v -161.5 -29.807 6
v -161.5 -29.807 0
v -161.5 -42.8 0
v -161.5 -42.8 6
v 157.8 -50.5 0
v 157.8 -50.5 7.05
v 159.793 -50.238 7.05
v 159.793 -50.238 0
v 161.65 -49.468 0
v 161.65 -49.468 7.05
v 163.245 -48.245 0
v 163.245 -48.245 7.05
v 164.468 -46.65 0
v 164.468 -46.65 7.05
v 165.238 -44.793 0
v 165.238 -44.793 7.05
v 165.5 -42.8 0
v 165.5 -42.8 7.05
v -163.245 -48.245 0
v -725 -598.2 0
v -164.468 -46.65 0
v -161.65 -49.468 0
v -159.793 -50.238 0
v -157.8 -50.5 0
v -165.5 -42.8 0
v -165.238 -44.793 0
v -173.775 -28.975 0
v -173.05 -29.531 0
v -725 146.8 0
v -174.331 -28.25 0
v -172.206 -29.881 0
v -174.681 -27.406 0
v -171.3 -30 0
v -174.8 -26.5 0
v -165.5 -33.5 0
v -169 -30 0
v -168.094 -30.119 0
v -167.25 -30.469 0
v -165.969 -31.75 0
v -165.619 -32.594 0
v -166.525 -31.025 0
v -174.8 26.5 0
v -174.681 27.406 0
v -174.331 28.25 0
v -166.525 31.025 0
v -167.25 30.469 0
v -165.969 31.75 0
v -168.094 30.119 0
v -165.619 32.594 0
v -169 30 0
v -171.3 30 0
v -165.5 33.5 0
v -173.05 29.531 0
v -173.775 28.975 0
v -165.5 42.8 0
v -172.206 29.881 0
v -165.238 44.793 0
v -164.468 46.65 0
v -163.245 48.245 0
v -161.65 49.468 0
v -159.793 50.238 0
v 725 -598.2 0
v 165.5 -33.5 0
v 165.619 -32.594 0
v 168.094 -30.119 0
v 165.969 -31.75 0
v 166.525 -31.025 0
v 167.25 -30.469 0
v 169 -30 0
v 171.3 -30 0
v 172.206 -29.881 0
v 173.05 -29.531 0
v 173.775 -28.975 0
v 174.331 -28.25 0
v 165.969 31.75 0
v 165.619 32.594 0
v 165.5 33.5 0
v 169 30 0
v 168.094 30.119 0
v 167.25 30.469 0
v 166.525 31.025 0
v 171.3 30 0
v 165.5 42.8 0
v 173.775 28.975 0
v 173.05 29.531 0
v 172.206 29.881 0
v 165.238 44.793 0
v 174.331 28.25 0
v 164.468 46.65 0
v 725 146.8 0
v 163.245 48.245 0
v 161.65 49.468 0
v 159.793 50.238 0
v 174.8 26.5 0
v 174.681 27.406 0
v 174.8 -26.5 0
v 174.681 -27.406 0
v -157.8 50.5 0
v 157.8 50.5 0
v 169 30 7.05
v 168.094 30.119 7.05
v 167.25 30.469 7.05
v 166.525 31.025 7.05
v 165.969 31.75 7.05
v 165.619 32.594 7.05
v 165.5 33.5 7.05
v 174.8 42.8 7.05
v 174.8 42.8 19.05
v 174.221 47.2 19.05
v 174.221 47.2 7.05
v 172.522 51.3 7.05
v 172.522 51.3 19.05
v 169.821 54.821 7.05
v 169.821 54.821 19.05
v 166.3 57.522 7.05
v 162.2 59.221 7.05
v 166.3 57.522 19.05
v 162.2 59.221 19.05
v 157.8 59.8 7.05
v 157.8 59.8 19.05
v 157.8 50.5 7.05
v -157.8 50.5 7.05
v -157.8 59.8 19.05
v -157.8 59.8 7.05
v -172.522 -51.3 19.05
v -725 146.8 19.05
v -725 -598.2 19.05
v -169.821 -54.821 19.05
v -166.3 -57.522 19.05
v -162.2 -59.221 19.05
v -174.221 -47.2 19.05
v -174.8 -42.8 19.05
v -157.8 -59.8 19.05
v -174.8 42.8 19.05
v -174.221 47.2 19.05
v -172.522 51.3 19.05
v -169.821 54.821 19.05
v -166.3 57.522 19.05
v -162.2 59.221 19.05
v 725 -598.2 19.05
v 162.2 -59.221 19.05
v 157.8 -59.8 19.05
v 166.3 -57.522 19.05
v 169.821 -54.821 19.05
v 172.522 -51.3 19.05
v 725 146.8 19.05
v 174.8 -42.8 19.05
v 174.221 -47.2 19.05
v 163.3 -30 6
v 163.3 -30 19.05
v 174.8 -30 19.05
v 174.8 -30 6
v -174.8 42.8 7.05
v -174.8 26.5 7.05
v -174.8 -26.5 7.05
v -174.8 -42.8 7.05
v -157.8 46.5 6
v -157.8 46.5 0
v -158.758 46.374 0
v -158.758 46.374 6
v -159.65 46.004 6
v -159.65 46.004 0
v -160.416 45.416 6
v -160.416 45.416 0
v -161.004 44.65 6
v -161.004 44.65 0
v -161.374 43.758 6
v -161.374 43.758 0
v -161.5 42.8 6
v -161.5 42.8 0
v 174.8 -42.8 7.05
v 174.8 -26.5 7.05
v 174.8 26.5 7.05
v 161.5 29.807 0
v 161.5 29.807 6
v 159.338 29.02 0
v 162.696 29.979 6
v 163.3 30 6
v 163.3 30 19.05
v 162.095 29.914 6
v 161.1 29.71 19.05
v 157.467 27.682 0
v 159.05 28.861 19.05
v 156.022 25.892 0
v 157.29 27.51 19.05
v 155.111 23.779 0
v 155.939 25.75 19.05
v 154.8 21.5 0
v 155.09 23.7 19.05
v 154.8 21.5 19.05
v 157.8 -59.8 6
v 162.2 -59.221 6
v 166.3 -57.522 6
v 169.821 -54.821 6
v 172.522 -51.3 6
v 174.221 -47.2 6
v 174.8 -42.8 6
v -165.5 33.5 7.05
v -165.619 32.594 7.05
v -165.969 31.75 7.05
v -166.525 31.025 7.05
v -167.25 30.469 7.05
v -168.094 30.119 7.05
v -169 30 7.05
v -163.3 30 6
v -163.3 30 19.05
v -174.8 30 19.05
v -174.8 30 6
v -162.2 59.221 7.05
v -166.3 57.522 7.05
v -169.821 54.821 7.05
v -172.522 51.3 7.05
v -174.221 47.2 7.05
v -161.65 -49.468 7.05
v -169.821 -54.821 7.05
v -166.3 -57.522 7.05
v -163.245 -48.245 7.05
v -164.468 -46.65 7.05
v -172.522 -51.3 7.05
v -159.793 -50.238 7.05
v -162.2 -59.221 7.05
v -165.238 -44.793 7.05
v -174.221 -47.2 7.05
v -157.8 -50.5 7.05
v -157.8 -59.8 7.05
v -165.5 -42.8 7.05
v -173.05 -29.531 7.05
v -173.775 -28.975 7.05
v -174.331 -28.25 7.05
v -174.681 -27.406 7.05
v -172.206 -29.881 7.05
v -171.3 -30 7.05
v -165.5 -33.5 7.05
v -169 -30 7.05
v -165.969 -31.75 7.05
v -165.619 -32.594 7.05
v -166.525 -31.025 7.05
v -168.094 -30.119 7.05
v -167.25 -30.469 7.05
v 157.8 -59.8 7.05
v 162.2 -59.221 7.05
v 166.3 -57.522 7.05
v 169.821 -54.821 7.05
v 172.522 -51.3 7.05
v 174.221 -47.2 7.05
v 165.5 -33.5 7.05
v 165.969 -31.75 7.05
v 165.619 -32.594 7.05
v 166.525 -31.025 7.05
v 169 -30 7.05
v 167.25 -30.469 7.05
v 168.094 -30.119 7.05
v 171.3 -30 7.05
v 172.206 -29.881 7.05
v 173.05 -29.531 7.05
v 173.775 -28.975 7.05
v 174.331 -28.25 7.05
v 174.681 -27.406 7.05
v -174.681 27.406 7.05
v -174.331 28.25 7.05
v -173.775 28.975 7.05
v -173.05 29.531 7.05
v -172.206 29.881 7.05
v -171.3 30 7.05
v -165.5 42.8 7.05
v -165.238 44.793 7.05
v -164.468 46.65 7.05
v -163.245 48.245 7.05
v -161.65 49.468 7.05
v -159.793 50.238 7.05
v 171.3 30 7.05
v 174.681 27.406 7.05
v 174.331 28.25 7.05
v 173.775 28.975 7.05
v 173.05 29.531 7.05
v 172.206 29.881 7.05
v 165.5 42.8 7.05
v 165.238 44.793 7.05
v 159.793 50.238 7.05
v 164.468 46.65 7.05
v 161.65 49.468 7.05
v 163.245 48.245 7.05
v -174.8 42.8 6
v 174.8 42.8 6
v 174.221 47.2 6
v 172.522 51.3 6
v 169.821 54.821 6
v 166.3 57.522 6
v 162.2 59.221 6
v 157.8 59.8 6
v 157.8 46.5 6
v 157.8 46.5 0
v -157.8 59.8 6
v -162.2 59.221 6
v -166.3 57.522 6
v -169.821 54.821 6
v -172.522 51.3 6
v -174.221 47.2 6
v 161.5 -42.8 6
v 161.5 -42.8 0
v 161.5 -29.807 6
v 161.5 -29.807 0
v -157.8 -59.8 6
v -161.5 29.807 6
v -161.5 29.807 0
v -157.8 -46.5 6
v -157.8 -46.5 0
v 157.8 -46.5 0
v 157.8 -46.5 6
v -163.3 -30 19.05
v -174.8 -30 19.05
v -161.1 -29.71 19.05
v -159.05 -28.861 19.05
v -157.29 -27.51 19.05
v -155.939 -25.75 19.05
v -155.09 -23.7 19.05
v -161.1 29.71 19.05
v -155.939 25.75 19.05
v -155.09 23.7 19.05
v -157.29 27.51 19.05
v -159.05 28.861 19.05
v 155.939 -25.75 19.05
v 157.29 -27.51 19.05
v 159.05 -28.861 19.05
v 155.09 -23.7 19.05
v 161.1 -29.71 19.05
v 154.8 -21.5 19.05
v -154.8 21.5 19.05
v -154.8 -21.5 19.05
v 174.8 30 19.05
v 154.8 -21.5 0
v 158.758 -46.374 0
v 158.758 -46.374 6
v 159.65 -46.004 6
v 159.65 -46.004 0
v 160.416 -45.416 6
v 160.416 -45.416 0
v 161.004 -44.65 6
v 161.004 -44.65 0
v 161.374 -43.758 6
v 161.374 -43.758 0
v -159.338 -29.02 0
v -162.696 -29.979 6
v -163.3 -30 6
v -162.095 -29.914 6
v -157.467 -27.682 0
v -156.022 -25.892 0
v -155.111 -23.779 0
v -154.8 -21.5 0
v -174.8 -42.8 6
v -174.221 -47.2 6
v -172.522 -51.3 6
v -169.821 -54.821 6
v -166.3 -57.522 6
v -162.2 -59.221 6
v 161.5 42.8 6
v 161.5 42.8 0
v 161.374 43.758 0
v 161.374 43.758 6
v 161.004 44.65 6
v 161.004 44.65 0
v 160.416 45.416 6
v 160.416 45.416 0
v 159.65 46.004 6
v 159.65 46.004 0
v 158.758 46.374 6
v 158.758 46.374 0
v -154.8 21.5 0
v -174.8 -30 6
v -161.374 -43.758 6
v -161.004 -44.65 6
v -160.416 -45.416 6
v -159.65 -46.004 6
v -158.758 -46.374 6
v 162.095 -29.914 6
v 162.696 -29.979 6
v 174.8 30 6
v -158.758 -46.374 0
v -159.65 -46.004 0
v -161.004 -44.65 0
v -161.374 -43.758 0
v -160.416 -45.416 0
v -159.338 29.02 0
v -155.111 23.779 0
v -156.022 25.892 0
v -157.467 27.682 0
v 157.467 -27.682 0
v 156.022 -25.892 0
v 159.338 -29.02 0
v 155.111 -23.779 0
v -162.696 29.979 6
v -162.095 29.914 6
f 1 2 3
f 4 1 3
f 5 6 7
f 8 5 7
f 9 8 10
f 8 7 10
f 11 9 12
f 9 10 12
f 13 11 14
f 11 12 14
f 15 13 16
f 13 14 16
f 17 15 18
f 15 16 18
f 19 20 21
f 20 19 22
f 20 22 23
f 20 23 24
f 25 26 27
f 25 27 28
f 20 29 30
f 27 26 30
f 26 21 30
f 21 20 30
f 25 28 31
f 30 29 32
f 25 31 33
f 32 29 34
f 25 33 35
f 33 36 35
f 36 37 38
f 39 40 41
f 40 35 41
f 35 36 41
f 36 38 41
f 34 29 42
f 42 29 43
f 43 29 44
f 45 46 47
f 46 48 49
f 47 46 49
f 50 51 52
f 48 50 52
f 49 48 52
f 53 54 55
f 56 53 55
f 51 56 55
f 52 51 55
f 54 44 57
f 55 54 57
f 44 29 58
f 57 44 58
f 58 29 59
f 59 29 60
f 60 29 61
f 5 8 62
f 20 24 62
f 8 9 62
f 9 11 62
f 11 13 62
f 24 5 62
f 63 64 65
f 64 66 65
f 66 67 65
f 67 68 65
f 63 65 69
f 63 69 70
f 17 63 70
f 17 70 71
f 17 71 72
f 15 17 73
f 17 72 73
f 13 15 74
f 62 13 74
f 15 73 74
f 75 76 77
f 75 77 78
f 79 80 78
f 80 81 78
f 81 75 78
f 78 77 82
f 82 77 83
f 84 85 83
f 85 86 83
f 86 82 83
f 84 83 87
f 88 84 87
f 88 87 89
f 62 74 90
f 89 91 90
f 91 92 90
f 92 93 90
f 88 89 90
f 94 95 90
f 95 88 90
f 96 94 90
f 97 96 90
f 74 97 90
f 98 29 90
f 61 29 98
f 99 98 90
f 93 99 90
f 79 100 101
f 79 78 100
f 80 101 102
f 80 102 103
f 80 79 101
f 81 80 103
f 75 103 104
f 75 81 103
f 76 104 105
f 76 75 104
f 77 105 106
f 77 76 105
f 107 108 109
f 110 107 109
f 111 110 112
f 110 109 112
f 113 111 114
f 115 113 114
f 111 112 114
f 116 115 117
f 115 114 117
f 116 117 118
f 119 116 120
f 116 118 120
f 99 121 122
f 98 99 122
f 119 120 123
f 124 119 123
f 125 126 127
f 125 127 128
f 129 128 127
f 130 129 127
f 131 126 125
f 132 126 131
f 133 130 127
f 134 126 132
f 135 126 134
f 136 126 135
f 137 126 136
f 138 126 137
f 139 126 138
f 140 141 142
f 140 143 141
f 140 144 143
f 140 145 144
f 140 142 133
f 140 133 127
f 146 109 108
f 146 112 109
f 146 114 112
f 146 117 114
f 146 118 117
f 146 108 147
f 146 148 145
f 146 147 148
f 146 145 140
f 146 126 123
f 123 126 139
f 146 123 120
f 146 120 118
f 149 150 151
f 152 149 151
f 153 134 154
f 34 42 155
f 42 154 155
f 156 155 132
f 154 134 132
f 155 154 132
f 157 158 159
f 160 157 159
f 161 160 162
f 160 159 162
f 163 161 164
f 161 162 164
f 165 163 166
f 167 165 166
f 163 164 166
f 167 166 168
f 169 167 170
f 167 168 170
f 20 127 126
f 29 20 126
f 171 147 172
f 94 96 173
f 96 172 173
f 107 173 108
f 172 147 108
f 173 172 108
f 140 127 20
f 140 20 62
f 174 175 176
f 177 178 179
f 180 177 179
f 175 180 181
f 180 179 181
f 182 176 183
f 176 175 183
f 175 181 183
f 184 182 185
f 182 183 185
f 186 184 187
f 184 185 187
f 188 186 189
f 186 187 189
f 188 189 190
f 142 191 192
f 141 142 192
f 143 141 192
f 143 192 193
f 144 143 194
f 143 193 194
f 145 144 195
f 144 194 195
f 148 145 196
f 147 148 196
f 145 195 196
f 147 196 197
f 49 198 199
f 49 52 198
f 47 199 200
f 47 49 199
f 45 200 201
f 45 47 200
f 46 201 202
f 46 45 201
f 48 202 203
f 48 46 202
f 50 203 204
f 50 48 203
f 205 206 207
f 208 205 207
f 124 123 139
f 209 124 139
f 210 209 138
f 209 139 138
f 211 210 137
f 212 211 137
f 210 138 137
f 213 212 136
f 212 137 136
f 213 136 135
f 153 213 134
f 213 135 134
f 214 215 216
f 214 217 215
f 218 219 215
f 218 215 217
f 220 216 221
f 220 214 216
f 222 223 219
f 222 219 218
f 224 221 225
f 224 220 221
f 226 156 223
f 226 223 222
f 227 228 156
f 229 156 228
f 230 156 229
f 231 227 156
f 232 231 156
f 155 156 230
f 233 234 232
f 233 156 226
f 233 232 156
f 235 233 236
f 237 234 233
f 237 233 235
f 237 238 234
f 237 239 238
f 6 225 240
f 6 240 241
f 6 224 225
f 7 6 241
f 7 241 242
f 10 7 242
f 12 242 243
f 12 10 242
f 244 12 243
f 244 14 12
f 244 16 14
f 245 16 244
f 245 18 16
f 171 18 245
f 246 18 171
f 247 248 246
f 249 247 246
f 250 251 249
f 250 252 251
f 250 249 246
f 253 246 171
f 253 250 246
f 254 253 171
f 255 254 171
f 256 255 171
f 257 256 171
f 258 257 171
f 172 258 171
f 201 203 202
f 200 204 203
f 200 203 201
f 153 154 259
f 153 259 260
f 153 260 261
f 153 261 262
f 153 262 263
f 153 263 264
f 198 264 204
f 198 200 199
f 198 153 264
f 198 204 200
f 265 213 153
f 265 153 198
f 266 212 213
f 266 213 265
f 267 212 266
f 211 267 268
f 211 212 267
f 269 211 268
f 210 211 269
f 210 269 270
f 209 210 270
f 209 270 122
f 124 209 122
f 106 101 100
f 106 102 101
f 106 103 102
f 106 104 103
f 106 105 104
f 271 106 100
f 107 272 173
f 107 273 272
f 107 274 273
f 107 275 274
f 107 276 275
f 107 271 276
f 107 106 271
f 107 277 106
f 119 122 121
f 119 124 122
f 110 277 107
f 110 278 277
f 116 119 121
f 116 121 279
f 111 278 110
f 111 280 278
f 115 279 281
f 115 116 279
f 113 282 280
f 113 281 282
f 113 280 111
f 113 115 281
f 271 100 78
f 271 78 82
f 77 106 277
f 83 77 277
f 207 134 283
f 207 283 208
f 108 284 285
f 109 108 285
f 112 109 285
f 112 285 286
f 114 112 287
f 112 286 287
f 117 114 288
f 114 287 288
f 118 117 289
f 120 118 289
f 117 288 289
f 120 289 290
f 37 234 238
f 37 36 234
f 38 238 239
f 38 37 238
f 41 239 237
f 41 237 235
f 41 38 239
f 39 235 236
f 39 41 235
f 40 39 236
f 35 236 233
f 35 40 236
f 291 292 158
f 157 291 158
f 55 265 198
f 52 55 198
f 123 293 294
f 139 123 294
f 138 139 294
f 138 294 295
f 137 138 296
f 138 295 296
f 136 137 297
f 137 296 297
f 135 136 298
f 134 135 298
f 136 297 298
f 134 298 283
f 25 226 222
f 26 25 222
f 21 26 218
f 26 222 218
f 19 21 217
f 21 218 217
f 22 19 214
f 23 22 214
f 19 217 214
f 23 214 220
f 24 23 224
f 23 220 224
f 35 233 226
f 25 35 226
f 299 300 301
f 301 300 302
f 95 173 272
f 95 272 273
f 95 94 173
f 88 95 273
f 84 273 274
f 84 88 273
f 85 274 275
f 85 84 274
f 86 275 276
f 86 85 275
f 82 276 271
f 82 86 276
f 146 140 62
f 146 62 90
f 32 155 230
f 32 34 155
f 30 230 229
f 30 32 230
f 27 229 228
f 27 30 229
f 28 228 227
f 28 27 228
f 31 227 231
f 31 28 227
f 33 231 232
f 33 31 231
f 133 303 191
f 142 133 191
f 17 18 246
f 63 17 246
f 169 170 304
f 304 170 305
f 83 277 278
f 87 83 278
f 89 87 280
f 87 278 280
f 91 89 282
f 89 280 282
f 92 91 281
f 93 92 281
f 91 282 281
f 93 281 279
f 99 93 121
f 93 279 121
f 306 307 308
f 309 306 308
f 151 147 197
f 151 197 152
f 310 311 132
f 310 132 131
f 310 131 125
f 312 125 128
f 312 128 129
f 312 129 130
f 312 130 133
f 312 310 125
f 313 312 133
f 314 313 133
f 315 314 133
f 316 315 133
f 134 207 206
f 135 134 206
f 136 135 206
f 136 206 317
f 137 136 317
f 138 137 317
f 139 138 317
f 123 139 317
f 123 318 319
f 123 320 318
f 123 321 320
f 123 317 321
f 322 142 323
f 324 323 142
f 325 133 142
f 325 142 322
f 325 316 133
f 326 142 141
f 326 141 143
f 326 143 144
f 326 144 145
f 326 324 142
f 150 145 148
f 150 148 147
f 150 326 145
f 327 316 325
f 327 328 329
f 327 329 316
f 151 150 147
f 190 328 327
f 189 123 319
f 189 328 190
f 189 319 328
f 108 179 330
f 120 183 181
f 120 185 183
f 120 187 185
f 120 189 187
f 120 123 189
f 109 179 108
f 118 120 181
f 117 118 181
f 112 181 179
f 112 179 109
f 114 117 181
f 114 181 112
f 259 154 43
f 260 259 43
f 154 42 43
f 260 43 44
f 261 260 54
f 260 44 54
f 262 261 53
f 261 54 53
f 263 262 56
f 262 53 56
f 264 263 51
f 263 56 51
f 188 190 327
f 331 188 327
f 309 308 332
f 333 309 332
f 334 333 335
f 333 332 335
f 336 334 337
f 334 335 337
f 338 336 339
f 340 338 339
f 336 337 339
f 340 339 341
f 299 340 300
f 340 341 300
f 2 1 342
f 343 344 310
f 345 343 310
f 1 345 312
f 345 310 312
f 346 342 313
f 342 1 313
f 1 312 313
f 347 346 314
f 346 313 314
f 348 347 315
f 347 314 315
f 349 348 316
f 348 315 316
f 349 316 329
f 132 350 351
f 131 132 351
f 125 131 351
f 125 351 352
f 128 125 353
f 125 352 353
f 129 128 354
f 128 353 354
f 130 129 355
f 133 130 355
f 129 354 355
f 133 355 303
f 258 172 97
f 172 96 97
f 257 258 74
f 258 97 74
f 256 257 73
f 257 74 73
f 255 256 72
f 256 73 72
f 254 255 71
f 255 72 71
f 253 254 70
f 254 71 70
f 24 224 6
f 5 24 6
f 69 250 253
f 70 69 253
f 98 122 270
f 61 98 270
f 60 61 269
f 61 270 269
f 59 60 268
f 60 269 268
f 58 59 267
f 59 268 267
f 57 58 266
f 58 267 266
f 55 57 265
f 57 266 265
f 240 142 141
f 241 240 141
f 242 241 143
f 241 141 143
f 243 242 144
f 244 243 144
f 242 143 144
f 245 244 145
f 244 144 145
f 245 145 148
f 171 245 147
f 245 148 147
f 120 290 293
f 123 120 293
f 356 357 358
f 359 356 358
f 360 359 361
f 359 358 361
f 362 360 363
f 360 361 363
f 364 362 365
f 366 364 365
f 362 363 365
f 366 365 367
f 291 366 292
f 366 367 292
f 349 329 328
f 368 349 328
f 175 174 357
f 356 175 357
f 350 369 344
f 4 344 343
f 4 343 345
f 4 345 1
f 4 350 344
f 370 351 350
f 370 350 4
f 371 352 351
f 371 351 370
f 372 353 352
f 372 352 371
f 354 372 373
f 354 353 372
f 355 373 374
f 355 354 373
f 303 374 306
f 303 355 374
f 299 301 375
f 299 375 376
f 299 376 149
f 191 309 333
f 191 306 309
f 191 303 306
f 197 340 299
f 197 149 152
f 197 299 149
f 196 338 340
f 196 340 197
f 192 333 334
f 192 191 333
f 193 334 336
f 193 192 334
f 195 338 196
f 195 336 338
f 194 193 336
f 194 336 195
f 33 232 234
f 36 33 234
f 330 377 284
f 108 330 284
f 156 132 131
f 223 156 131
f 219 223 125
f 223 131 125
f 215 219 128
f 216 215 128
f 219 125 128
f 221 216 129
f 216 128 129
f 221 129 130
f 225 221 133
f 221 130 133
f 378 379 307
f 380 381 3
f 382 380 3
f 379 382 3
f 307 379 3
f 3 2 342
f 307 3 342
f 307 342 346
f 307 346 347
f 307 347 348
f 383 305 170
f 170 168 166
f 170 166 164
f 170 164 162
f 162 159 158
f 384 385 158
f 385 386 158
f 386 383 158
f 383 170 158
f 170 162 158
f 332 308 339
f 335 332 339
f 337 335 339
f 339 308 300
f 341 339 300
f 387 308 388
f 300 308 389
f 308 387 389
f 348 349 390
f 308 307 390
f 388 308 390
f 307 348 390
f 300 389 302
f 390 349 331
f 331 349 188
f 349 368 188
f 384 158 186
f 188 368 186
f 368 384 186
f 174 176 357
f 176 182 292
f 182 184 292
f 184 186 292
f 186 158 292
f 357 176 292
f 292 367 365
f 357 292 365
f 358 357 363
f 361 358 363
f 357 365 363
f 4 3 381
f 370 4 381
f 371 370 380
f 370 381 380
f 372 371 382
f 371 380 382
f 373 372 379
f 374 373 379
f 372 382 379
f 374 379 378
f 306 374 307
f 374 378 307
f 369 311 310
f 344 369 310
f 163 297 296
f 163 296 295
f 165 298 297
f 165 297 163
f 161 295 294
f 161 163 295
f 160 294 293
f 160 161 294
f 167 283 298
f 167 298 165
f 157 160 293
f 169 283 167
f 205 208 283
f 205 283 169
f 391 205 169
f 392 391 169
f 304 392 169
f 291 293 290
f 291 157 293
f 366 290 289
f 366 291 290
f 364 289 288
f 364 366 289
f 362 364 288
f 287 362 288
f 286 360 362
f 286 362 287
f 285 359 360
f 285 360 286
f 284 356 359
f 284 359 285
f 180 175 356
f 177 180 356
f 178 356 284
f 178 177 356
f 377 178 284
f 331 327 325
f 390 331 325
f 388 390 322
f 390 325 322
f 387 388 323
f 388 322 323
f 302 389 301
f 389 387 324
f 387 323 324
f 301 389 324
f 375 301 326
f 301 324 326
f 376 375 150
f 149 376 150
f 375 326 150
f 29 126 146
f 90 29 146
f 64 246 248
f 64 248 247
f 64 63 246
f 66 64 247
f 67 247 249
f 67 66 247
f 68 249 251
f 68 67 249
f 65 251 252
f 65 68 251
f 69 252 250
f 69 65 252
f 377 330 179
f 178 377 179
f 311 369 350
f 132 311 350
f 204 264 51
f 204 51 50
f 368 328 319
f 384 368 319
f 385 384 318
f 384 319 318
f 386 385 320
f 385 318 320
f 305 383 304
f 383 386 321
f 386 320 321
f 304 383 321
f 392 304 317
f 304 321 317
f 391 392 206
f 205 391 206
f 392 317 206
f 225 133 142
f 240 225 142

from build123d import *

# Parameters (mm, degrees)
F1_DEPTH  = 19.05
F3_DEPTH  = 19.051
F4_W      = 406.4
F4_H      = 177.8
F5_DEPTH  = 6
F6_W      = 1450
F6_H      = 745
F7_DEPTH  = 19.05
F9_DEPTH  = 12
F11_DEPTH = 7.051
F12_W     = 9.3
F12_H     = 60
F13_DEPTH = 7.051
F14_R     = 3.5


with BuildPart() as f1:
    # F0 (on Top) → F1 (new body)
    with BuildSketch(Plane.XY):
        with BuildLine():
            ThreePointArc((-174.8, -42.8), (-169.8208152802, -54.8208152802), (-157.8, -59.8))
            Line((-157.8, -59.8), (157.8, -59.8))
            ThreePointArc((157.8, -59.8), (169.8208152802, -54.8208152802), (174.8, -42.8))
            Line((174.8, -42.8), (174.8, 42.8))
            ThreePointArc((174.8, 42.8), (169.8208152802, 54.8208152802), (157.8, 59.8))
            Line((157.8, 59.8), (-157.8, 59.8))
            ThreePointArc((-157.8, 59.8), (-169.8208152802, 54.8208152802), (-174.8, 42.8))
            Line((-174.8, 42.8), (-174.8, -42.8))
        make_face()
    extrude(amount=F1_DEPTH)

    # F2 (on face) → F3 (cut, through all)
    with BuildSketch(Plane.XY.offset(19.05)):
        with BuildLine():
            Line((-174.8, 30), (-174.8, -30))
            Line((-174.8, -30), (-163.3, -30))
            ThreePointArc((-163.3, -30), (-157.2895923599, -27.5104076401), (-154.8, -21.5))
            Line((-154.8, -21.5), (-154.8, 21.5))
            ThreePointArc((-154.8, 21.5), (-157.2895923599, 27.5104076401), (-163.3, 30))
            Line((-163.3, 30), (-174.8, 30))
        make_face()
        with BuildLine():
            Line((174.8, -30), (174.8, 30))
            Line((174.8, 30), (163.3, 30))
            ThreePointArc((163.3, 30), (157.2895923599, 27.5104076401), (154.8, 21.5))
            Line((154.8, 21.5), (154.8, -21.5))
            ThreePointArc((154.8, -21.5), (157.2895923599, -27.5104076401), (163.3, -30))
            Line((163.3, -30), (174.8, -30))
        make_face()
    extrude(amount=-F3_DEPTH, mode=Mode.SUBTRACT)

    # F4 (on face) → F5 (cut)
    with BuildSketch(Plane(origin=(0, 0, 0), x_dir=(1, 0, 0), z_dir=(0, 0, -1))):
        Rectangle(F4_W, F4_H)
        with BuildLine():
            ThreePointArc((161.5, -42.8), (160.4162950904, -45.4162950904), (157.8, -46.5))
            Line((157.8, -46.5), (-157.8, -46.5))
            ThreePointArc((-157.8, -46.5), (-160.4162950904, -45.4162950904), (-161.5, -42.8))
            Line((-161.5, -42.8), (-161.5, 42.8))
            ThreePointArc((-161.5, 42.8), (-160.4162950904, 45.4162950904), (-157.8, 46.5))
            Line((-157.8, 46.5), (157.8, 46.5))
            ThreePointArc((157.8, 46.5), (160.4162950904, 45.4162950904), (161.5, 42.8))
            Line((161.5, 42.8), (161.5, -42.8))
        make_face(mode=Mode.SUBTRACT)
    extrude(amount=-F5_DEPTH, mode=Mode.SUBTRACT)


with BuildPart() as f7:
    # F6 (on face) → F7 (new body)
    with BuildSketch(Plane.XY.offset(19.05)):
        with Locations((0, -225.7)):
            Rectangle(F6_W, F6_H)
    extrude(amount=-F7_DEPTH)

    # F8 (on face) → F9 (cut)
    with BuildSketch(Plane.XY.offset(19.05)):
        with BuildLine():
            Line((157.8, 59.8), (-157.8, 59.8))
            ThreePointArc((-157.8, 59.8), (-169.8208152802, 54.8208152802), (-174.8, 42.8))
            Line((-174.8, 42.8), (-174.8, 30))
            Line((-174.8, 30), (-174.8, -30))
            Line((-174.8, -30), (-174.8, -42.8))
            ThreePointArc((-174.8, -42.8), (-169.8208152802, -54.8208152802), (-157.8, -59.8))
            Line((-157.8, -59.8), (157.8, -59.8))
            ThreePointArc((157.8, -59.8), (169.8208152802, -54.8208152802), (174.8, -42.8))
            Line((174.8, -42.8), (174.8, -30))
            Line((174.8, -30), (174.8, 30))
            Line((174.8, 30), (174.8, 42.8))
            ThreePointArc((174.8, 42.8), (169.8208152802, 54.8208152802), (157.8, 59.8))
        make_face()
    extrude(amount=-F9_DEPTH, mode=Mode.SUBTRACT)

    # F10 (on face) → F11 (cut, through all)
    with BuildSketch(Plane.XY.offset(7.05)):
        with BuildLine():
            Line((-165.5, -30), (-165.5, -42.8))
            ThreePointArc((-165.5, -42.8), (-163.2447222151, -48.2447222151), (-157.8, -50.5))
            Line((-157.8, -50.5), (157.8, -50.5))
            ThreePointArc((157.8, -50.5), (163.2447222151, -48.2447222151), (165.5, -42.8))
            Line((165.5, -42.8), (165.5, -30))
            Line((165.5, -30), (165.5, 30))
            Line((165.5, 30), (165.5, 42.8))
            ThreePointArc((165.5, 42.8), (163.2447222151, 48.2447222151), (157.8, 50.5))
            Line((157.8, 50.5), (-157.8, 50.5))
            ThreePointArc((-157.8, 50.5), (-163.2447222151, 48.2447222151), (-165.5, 42.8))
            Line((-165.5, 42.8), (-165.5, 30))
            Line((-165.5, 30), (-165.5, -30))
        make_face()
    extrude(amount=-F11_DEPTH, mode=Mode.SUBTRACT)

    # F12 (on face) → F13 (cut, through all)
    with BuildSketch(Plane.XY.offset(7.05)):
        with Locations((-170.15, 0)):
            Rectangle(F12_W, F12_H)
        with Locations((170.15, 0)):
            Rectangle(F12_W, F12_H)
    extrude(amount=-F13_DEPTH, mode=Mode.SUBTRACT)

    # F14
    f14_edges = [f7.edges().sort_by_distance(p)[0] for p in [
        (-165.5, 30, 3.525),
        (-174.8, 30, 3.525),
        (-174.8, -30, 3.525),
        (-165.5, -30, 3.525),
        (165.5, 30, 3.525),
        (174.8, 30, 3.525),
        (165.5, -30, 3.525),
        (174.8, -30, 3.525),
    ]]
    fillet(f14_edges, radius=F14_R)


solid = Compound([f1.part, f7.part])
